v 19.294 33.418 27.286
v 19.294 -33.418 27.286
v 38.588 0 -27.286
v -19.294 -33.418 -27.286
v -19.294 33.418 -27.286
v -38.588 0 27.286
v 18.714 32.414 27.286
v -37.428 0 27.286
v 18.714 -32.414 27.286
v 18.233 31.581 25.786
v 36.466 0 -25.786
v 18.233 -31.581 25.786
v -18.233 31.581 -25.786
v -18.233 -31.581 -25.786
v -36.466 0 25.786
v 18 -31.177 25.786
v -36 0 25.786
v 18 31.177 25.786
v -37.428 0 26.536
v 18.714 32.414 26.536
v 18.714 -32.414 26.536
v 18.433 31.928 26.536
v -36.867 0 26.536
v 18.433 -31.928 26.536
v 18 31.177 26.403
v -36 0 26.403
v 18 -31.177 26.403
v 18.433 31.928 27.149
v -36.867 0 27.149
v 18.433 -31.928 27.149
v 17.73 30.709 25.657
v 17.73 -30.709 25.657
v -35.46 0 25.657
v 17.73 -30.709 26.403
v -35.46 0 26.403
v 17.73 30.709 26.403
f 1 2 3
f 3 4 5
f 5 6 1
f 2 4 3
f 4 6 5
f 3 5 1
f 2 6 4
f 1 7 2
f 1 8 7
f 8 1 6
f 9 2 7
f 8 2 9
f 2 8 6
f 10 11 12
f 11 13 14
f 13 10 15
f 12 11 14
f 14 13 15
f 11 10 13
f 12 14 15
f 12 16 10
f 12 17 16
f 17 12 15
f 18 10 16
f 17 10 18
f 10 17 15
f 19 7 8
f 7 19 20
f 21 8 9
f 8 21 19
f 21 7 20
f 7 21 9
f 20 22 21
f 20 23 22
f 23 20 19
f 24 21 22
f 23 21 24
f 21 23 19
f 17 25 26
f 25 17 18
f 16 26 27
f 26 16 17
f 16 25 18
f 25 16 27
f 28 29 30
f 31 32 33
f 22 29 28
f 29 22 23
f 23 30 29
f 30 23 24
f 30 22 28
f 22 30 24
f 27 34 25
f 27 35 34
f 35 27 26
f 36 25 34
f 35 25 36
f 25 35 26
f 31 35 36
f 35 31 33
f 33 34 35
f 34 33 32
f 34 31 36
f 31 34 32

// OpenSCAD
arete = 66.836;
paroi = 1.5;
echelleReductionAjustementBouchon = 0.985;
r = 0.19; // résolution d'impression sur l'axe Z
octa_sch = [3,4];
Cpi = 3.14159;
Cphi = (1+sqrt(5))/2;
Cepsilon = 0.00000001;

function octa_ext_radius(a) = 
    a/2*(sqrt(2));
    
function octa_int_radius(a) = 
    a/6*sqrt(6);
    
function octa_arete_from(radius) = 
    radius*6/sqrt(6);
    
externalRadius = octa_ext_radius(arete);
internalRadius = octa_ext_radius( 
                    octa_arete_from(
                        octa_int_radius(arete)-paroi));
                        
echo(externalRadius); 
echo(internalRadius);

//octahedron(arete);
//octa_creux();
//decoupe_bouchon();
corps_ouvert();
bouchon();
//trou();

module corps_ouvert() {
	difference() {
		octa_creux();
		decoupe_bouchon();
	}
}

module bouchon() {
//    rotate([180, 0, 0])
	scale([echelleReductionAjustementBouchon, echelleReductionAjustementBouchon, 0.995])
	difference () {
        intersection() {
            octa_creux();
            decoupe_bouchon(echelleReductionAjustementBouchon);
        }
	}
}

module octa_creux() {
	difference() {
        octahedron(externalRadius);
        octahedron(internalRadius);
	}
}

module decoupe_bouchon(scale=1) {
    distance = octa_int_radius(arete);
	rotate([0,0,60]) translate([0,0, distance])
		cylinder(paroi, r=arete*0.56, $fn=3, center=true);
	rotate([0,0,60]) translate([0,0, distance-paroi])
		cylinder(paroi, r=(arete-paroi)*0.551, $fn=3, center=true);
}


module octahedron(rad) {
    // create an instance of a spherical coordinate
    // long - rotation around z -axis
    // lat - latitude, starting at 0 == 'north pole'
    // rad - distance from center
    function sph(long, lat, rad=1) = [long, lat, rad];
    
    // Convert spherical to cartesian
    function sph_to_cart(s) = [
	clean(s[2]*sin(s[1])*cos(s[0])),  

	clean(s[2]*sin(s[1])*sin(s[0])),

	clean(s[2]*cos(s[1]))
	];

    function sphu_from_cart(c, rad=1) = sph(
        atan2(c[1],c[0]), 
        atan2(sqrt(c[0]*c[0]+c[1]*c[1]), c[2]), 
        rad
        );

    octa_cart = [
        [+1, 0, 0],  // + x axis
        [-1, 0, 0],	// - x axis
        [0, +1, 0],	// + y axis
        [0, -1, 0],	// - y axis
        [0, 0, +1],	// + z axis
        [0, 0, -1] 	// - z axis
    ];

    function octa_unit(rad=1) = [
        sph_to_cart(sphu_from_cart(octa_cart[0], rad)), 
        sph_to_cart(sphu_from_cart(octa_cart[1], rad)),
        sph_to_cart(sphu_from_cart(octa_cart[2], rad)),
        sph_to_cart(sphu_from_cart(octa_cart[3], rad)),
        sph_to_cart(sphu_from_cart(octa_cart[4], rad)), 
        sph_to_cart(sphu_from_cart(octa_cart[5], rad)), 
        ];

    octafaces = [
        [4,2,0],
        [4,0,3],
        [4,3,1],
        [4,1,2],
        [5,0,2],
        [5,3,0],
        [5,1,3],
        [5,2,1]
        ];

    octa_edges = [
        [0,2], 
        [0,3],
        [0,4],
        [0,5],
        [1,2],
        [1,3],
        [1,4],
        [1,5],
        [2,4], 
        [2,5],
        [3,4],
        [3,5],
        ];

    function octahedron(rad=1) = [octa_unit(rad), octafaces, octa_edges];

    rotate([0, 90-plat_dihedral(octa_sch)/2, 0])
    rotate([45, 0, 0])
    polyhedron(octa_unit(rad), faces=octafaces);
}
//translate([0, 0, -17.7])
//cylinder(5,40,40);

function clean(n) = (n < 0) ? ((n < -Cepsilon) ? n : 0) : 
	(n < Cepsilon) ? 0 : n; 

function plat_dihedral(pq) = 2 * asin( cos(180/pq[1])/sin(180/pq[0]));

function plat_circumradius(pq, a) = 
	(a/2)*
	tan(Cpi/pq[1])*
	tan(plat_dihedral(pq)/2);

function plat_midradius(pq, a) = 
	(a/2)*
	cos(Cpi/pq[0])*
	tan(plat_dihedral(pq)/2);

function plat_inradius(pq,a) = 
	a/(2*tan(Cpi/pq[0]))*
	sqrt((1-cos(plat_dihedral(pq)))/(1+cos(plat_dihedral(pq))));

function plat_a_from_inradius(pq, inradius) =
    inradius*(2*tan(Cpi/pq[0]))/
	sqrt((1-cos(plat_dihedral(pq)))/(1+cos(plat_dihedral(pq))));
